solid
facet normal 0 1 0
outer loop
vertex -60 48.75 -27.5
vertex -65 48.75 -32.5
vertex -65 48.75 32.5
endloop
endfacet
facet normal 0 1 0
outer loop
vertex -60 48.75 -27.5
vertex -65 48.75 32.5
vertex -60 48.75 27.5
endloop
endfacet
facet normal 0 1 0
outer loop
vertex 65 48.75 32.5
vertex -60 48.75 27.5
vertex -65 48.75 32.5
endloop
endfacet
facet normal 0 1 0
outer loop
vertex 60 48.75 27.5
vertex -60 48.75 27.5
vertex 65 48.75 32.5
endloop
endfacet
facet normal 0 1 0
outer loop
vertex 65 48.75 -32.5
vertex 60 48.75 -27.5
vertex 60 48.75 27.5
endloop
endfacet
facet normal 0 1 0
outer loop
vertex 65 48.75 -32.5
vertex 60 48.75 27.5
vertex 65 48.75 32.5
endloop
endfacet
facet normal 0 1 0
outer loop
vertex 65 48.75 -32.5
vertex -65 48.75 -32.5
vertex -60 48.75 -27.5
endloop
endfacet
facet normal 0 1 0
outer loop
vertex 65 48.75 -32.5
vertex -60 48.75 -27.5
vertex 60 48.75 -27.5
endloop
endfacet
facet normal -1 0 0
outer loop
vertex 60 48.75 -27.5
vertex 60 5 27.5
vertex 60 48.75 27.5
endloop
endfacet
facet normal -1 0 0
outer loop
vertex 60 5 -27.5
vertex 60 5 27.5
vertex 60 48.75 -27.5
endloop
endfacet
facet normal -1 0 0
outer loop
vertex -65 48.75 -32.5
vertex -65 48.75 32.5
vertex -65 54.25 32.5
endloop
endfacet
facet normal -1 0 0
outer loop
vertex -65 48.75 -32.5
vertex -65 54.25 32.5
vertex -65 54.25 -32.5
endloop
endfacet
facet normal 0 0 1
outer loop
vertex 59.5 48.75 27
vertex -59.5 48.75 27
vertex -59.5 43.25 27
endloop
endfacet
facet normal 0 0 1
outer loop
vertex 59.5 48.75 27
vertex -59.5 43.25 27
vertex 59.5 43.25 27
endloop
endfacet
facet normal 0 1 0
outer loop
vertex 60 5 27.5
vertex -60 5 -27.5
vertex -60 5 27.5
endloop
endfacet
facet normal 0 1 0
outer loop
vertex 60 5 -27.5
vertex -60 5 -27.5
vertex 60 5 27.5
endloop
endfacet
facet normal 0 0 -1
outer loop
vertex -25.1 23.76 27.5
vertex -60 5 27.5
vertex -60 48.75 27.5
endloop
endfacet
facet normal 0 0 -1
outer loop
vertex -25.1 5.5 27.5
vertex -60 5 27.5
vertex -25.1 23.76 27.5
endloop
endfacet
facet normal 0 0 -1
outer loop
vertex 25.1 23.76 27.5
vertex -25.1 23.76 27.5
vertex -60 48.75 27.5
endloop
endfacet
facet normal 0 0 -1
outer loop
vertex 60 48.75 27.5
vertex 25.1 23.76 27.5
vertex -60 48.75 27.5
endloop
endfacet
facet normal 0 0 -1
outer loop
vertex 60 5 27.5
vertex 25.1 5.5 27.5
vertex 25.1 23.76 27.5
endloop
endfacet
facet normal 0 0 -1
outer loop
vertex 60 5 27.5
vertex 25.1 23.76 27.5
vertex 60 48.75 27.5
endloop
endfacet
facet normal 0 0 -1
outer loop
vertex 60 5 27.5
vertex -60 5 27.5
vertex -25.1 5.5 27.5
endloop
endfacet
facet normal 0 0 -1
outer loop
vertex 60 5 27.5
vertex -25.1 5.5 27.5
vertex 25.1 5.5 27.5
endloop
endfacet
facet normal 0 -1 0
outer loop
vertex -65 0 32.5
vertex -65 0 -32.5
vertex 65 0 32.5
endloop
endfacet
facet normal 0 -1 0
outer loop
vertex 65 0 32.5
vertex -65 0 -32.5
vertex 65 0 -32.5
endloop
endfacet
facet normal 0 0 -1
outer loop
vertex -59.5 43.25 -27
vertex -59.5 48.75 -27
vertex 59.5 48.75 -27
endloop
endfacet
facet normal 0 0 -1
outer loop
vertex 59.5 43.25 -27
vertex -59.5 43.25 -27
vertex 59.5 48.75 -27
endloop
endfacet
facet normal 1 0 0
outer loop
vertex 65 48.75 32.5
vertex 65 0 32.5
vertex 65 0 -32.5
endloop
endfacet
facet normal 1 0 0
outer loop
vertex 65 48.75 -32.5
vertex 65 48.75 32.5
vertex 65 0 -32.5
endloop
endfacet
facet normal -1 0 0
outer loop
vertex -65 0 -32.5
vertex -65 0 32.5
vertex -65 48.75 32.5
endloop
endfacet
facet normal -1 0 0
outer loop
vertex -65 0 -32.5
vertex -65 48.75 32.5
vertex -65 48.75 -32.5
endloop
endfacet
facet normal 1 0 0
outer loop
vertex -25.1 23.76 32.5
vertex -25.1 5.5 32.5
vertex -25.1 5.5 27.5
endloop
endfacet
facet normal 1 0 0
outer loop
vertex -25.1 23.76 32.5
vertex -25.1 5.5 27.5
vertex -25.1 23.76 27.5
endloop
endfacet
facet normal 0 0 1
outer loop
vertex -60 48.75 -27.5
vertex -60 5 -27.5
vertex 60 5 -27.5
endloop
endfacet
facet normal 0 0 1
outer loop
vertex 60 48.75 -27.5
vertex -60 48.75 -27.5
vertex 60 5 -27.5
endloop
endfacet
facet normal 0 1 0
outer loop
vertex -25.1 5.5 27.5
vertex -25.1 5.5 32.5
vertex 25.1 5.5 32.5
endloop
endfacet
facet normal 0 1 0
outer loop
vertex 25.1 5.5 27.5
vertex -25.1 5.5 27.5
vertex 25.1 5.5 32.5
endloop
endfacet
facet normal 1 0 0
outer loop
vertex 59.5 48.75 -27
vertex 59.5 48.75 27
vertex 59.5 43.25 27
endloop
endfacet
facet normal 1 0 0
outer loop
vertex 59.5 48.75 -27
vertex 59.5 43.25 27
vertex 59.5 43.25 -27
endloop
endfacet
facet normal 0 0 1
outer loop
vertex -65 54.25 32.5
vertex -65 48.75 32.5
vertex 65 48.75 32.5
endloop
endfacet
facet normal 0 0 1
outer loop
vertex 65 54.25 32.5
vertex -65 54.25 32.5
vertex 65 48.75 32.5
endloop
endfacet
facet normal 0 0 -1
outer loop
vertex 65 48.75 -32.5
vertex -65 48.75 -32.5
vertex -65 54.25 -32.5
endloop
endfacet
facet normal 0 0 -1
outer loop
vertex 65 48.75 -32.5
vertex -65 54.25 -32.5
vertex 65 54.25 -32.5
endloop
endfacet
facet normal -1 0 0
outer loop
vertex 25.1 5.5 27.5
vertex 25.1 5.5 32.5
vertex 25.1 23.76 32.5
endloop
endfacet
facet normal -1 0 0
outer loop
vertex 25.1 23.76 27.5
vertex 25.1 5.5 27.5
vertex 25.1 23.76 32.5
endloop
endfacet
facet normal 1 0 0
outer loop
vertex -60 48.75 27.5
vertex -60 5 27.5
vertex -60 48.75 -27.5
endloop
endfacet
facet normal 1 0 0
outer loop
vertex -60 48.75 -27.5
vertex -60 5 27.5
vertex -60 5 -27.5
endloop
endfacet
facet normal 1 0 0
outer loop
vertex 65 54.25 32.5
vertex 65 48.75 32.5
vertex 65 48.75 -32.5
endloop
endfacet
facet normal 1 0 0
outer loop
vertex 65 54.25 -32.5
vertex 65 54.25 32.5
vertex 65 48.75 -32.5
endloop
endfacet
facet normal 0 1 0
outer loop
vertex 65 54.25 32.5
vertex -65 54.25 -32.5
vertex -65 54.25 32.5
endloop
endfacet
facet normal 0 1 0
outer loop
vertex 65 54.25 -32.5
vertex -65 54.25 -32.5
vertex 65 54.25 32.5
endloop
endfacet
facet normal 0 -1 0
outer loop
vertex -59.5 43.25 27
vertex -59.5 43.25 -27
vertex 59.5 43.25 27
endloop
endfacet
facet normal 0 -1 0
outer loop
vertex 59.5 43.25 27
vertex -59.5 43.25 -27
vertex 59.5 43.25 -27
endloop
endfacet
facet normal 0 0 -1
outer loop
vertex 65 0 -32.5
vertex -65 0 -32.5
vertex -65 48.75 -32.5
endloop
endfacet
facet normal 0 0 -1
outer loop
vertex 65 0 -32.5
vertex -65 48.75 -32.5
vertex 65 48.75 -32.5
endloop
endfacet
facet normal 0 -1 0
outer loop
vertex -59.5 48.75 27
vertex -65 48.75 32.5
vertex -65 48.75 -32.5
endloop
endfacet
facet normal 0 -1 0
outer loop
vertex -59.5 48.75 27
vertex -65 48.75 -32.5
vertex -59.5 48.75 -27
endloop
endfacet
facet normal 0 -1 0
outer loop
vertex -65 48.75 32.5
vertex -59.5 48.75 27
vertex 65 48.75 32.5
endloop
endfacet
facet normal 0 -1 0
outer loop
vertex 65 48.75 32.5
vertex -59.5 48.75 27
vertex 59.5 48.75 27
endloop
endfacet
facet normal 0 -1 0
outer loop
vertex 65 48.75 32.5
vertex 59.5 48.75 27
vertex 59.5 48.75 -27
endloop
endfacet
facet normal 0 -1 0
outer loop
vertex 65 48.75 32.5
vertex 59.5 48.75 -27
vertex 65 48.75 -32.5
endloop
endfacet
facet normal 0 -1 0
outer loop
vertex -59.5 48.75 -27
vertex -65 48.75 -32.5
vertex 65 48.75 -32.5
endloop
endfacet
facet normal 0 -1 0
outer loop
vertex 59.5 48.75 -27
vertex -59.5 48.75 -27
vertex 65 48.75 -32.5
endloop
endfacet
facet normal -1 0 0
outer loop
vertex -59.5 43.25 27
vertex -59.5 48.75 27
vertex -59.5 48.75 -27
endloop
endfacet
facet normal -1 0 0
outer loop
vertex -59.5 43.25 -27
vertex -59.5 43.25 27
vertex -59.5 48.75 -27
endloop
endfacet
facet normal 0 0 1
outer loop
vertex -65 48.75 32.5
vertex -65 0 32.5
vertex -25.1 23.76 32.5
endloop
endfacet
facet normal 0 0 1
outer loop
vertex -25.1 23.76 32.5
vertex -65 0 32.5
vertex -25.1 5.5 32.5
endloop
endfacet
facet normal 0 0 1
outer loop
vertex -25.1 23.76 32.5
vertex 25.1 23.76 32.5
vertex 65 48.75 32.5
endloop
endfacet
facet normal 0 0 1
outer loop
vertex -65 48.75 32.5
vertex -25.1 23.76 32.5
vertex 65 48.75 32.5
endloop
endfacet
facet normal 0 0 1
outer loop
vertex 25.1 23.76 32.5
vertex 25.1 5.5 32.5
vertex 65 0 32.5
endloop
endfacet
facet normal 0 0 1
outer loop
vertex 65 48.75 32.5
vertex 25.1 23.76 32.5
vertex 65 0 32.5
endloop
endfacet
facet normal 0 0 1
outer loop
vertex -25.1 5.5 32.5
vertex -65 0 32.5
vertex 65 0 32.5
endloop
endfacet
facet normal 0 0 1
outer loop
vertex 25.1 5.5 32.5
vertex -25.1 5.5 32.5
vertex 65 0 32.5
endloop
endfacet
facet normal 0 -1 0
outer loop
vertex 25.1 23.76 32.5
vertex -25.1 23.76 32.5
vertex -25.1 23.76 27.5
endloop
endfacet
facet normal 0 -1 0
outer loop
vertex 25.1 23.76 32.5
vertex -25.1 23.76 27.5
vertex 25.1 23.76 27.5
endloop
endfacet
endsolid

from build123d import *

# Parameters (mm, degrees)
CROQUIS1_W              = 130
CROQUIS1_H              = 65
SALIENTE_EXTRUIR1_DEPTH = 48.75
VACIADO1_T              = -5
CROQUIS2_W              = 130
CROQUIS2_H              = 65
CROQUIS2_W_2            = 120
CROQUIS2_H_2            = 55
CROQUIS2_W_3            = 119
CROQUIS2_H_3            = 54
SALIENTE_EXTRUIR2_DEPTH = 5.5
CROQUIS2_4_W            = 119
CROQUIS2_4_H            = 54
SALIENTE_EXTRUIR3_DEPTH = 5.5
CROQUIS3_W              = 50.2
CROQUIS3_H              = 18.26
CORTAR_EXTRUIR1_DEPTH   = 5


with BuildPart() as part:
    # Croquis1 → Saliente-Extruir1 (new body)
    with BuildSketch(Plane(origin=(0, 0, 0), x_dir=(1, 0, 0), z_dir=(0, 1, 0))):
        Rectangle(CROQUIS1_W, CROQUIS1_H)
    extrude(amount=SALIENTE_EXTRUIR1_DEPTH)

    # Vaciado1
    vaciado1_openings = [part.faces().sort_by_distance(p)[0] for p in [
        (0, 48.75, 0),
    ]]
    offset(amount=VACIADO1_T, openings=vaciado1_openings, kind=Kind.INTERSECTION)

    # Croquis3 → Cortar-Extruir1 (cut)
    with BuildSketch(Plane.XY.offset(32.5)):
        with Locations((0, 14.63)):
            Rectangle(CROQUIS3_W, CROQUIS3_H)
    extrude(amount=-CORTAR_EXTRUIR1_DEPTH, mode=Mode.SUBTRACT)


with BuildPart() as body_2:
    # Croquis2 → Saliente-Extruir2 (new body)
    # profile 1 of 3: a face of its own
    with BuildSketch(Plane(origin=(0, 48.75, 0), x_dir=(1, 0, 0), z_dir=(0, 1, 0))):
        Rectangle(CROQUIS2_W, CROQUIS2_H)
        Rectangle(CROQUIS2_W_2, CROQUIS2_H_2, mode=Mode.SUBTRACT)
    # profile 2 of 3: a face of its own
    with BuildSketch(Plane(origin=(0, 48.75, 0), x_dir=(1, 0, 0), z_dir=(0, 1, 0))):
        Rectangle(CROQUIS2_W_2, CROQUIS2_H_2)
        Rectangle(CROQUIS2_W_3, CROQUIS2_H_3, mode=Mode.SUBTRACT)
    # profile 3 of 3: a face of its own
    with BuildSketch(Plane(origin=(0, 48.75, 0), x_dir=(1, 0, 0), z_dir=(0, 1, 0))):
        Rectangle(CROQUIS2_W_3, CROQUIS2_H_3)
    extrude(amount=SALIENTE_EXTRUIR2_DEPTH)

    # Croquis2<4> → Saliente-Extruir3 (add)
    with BuildSketch(Plane(origin=(0, 48.75, 0), x_dir=(1, 0, 0), z_dir=(0, 1, 0))):
        Rectangle(CROQUIS2_4_W, CROQUIS2_4_H)
    extrude(amount=-SALIENTE_EXTRUIR3_DEPTH)


solid = Compound([part.part, body_2.part])
